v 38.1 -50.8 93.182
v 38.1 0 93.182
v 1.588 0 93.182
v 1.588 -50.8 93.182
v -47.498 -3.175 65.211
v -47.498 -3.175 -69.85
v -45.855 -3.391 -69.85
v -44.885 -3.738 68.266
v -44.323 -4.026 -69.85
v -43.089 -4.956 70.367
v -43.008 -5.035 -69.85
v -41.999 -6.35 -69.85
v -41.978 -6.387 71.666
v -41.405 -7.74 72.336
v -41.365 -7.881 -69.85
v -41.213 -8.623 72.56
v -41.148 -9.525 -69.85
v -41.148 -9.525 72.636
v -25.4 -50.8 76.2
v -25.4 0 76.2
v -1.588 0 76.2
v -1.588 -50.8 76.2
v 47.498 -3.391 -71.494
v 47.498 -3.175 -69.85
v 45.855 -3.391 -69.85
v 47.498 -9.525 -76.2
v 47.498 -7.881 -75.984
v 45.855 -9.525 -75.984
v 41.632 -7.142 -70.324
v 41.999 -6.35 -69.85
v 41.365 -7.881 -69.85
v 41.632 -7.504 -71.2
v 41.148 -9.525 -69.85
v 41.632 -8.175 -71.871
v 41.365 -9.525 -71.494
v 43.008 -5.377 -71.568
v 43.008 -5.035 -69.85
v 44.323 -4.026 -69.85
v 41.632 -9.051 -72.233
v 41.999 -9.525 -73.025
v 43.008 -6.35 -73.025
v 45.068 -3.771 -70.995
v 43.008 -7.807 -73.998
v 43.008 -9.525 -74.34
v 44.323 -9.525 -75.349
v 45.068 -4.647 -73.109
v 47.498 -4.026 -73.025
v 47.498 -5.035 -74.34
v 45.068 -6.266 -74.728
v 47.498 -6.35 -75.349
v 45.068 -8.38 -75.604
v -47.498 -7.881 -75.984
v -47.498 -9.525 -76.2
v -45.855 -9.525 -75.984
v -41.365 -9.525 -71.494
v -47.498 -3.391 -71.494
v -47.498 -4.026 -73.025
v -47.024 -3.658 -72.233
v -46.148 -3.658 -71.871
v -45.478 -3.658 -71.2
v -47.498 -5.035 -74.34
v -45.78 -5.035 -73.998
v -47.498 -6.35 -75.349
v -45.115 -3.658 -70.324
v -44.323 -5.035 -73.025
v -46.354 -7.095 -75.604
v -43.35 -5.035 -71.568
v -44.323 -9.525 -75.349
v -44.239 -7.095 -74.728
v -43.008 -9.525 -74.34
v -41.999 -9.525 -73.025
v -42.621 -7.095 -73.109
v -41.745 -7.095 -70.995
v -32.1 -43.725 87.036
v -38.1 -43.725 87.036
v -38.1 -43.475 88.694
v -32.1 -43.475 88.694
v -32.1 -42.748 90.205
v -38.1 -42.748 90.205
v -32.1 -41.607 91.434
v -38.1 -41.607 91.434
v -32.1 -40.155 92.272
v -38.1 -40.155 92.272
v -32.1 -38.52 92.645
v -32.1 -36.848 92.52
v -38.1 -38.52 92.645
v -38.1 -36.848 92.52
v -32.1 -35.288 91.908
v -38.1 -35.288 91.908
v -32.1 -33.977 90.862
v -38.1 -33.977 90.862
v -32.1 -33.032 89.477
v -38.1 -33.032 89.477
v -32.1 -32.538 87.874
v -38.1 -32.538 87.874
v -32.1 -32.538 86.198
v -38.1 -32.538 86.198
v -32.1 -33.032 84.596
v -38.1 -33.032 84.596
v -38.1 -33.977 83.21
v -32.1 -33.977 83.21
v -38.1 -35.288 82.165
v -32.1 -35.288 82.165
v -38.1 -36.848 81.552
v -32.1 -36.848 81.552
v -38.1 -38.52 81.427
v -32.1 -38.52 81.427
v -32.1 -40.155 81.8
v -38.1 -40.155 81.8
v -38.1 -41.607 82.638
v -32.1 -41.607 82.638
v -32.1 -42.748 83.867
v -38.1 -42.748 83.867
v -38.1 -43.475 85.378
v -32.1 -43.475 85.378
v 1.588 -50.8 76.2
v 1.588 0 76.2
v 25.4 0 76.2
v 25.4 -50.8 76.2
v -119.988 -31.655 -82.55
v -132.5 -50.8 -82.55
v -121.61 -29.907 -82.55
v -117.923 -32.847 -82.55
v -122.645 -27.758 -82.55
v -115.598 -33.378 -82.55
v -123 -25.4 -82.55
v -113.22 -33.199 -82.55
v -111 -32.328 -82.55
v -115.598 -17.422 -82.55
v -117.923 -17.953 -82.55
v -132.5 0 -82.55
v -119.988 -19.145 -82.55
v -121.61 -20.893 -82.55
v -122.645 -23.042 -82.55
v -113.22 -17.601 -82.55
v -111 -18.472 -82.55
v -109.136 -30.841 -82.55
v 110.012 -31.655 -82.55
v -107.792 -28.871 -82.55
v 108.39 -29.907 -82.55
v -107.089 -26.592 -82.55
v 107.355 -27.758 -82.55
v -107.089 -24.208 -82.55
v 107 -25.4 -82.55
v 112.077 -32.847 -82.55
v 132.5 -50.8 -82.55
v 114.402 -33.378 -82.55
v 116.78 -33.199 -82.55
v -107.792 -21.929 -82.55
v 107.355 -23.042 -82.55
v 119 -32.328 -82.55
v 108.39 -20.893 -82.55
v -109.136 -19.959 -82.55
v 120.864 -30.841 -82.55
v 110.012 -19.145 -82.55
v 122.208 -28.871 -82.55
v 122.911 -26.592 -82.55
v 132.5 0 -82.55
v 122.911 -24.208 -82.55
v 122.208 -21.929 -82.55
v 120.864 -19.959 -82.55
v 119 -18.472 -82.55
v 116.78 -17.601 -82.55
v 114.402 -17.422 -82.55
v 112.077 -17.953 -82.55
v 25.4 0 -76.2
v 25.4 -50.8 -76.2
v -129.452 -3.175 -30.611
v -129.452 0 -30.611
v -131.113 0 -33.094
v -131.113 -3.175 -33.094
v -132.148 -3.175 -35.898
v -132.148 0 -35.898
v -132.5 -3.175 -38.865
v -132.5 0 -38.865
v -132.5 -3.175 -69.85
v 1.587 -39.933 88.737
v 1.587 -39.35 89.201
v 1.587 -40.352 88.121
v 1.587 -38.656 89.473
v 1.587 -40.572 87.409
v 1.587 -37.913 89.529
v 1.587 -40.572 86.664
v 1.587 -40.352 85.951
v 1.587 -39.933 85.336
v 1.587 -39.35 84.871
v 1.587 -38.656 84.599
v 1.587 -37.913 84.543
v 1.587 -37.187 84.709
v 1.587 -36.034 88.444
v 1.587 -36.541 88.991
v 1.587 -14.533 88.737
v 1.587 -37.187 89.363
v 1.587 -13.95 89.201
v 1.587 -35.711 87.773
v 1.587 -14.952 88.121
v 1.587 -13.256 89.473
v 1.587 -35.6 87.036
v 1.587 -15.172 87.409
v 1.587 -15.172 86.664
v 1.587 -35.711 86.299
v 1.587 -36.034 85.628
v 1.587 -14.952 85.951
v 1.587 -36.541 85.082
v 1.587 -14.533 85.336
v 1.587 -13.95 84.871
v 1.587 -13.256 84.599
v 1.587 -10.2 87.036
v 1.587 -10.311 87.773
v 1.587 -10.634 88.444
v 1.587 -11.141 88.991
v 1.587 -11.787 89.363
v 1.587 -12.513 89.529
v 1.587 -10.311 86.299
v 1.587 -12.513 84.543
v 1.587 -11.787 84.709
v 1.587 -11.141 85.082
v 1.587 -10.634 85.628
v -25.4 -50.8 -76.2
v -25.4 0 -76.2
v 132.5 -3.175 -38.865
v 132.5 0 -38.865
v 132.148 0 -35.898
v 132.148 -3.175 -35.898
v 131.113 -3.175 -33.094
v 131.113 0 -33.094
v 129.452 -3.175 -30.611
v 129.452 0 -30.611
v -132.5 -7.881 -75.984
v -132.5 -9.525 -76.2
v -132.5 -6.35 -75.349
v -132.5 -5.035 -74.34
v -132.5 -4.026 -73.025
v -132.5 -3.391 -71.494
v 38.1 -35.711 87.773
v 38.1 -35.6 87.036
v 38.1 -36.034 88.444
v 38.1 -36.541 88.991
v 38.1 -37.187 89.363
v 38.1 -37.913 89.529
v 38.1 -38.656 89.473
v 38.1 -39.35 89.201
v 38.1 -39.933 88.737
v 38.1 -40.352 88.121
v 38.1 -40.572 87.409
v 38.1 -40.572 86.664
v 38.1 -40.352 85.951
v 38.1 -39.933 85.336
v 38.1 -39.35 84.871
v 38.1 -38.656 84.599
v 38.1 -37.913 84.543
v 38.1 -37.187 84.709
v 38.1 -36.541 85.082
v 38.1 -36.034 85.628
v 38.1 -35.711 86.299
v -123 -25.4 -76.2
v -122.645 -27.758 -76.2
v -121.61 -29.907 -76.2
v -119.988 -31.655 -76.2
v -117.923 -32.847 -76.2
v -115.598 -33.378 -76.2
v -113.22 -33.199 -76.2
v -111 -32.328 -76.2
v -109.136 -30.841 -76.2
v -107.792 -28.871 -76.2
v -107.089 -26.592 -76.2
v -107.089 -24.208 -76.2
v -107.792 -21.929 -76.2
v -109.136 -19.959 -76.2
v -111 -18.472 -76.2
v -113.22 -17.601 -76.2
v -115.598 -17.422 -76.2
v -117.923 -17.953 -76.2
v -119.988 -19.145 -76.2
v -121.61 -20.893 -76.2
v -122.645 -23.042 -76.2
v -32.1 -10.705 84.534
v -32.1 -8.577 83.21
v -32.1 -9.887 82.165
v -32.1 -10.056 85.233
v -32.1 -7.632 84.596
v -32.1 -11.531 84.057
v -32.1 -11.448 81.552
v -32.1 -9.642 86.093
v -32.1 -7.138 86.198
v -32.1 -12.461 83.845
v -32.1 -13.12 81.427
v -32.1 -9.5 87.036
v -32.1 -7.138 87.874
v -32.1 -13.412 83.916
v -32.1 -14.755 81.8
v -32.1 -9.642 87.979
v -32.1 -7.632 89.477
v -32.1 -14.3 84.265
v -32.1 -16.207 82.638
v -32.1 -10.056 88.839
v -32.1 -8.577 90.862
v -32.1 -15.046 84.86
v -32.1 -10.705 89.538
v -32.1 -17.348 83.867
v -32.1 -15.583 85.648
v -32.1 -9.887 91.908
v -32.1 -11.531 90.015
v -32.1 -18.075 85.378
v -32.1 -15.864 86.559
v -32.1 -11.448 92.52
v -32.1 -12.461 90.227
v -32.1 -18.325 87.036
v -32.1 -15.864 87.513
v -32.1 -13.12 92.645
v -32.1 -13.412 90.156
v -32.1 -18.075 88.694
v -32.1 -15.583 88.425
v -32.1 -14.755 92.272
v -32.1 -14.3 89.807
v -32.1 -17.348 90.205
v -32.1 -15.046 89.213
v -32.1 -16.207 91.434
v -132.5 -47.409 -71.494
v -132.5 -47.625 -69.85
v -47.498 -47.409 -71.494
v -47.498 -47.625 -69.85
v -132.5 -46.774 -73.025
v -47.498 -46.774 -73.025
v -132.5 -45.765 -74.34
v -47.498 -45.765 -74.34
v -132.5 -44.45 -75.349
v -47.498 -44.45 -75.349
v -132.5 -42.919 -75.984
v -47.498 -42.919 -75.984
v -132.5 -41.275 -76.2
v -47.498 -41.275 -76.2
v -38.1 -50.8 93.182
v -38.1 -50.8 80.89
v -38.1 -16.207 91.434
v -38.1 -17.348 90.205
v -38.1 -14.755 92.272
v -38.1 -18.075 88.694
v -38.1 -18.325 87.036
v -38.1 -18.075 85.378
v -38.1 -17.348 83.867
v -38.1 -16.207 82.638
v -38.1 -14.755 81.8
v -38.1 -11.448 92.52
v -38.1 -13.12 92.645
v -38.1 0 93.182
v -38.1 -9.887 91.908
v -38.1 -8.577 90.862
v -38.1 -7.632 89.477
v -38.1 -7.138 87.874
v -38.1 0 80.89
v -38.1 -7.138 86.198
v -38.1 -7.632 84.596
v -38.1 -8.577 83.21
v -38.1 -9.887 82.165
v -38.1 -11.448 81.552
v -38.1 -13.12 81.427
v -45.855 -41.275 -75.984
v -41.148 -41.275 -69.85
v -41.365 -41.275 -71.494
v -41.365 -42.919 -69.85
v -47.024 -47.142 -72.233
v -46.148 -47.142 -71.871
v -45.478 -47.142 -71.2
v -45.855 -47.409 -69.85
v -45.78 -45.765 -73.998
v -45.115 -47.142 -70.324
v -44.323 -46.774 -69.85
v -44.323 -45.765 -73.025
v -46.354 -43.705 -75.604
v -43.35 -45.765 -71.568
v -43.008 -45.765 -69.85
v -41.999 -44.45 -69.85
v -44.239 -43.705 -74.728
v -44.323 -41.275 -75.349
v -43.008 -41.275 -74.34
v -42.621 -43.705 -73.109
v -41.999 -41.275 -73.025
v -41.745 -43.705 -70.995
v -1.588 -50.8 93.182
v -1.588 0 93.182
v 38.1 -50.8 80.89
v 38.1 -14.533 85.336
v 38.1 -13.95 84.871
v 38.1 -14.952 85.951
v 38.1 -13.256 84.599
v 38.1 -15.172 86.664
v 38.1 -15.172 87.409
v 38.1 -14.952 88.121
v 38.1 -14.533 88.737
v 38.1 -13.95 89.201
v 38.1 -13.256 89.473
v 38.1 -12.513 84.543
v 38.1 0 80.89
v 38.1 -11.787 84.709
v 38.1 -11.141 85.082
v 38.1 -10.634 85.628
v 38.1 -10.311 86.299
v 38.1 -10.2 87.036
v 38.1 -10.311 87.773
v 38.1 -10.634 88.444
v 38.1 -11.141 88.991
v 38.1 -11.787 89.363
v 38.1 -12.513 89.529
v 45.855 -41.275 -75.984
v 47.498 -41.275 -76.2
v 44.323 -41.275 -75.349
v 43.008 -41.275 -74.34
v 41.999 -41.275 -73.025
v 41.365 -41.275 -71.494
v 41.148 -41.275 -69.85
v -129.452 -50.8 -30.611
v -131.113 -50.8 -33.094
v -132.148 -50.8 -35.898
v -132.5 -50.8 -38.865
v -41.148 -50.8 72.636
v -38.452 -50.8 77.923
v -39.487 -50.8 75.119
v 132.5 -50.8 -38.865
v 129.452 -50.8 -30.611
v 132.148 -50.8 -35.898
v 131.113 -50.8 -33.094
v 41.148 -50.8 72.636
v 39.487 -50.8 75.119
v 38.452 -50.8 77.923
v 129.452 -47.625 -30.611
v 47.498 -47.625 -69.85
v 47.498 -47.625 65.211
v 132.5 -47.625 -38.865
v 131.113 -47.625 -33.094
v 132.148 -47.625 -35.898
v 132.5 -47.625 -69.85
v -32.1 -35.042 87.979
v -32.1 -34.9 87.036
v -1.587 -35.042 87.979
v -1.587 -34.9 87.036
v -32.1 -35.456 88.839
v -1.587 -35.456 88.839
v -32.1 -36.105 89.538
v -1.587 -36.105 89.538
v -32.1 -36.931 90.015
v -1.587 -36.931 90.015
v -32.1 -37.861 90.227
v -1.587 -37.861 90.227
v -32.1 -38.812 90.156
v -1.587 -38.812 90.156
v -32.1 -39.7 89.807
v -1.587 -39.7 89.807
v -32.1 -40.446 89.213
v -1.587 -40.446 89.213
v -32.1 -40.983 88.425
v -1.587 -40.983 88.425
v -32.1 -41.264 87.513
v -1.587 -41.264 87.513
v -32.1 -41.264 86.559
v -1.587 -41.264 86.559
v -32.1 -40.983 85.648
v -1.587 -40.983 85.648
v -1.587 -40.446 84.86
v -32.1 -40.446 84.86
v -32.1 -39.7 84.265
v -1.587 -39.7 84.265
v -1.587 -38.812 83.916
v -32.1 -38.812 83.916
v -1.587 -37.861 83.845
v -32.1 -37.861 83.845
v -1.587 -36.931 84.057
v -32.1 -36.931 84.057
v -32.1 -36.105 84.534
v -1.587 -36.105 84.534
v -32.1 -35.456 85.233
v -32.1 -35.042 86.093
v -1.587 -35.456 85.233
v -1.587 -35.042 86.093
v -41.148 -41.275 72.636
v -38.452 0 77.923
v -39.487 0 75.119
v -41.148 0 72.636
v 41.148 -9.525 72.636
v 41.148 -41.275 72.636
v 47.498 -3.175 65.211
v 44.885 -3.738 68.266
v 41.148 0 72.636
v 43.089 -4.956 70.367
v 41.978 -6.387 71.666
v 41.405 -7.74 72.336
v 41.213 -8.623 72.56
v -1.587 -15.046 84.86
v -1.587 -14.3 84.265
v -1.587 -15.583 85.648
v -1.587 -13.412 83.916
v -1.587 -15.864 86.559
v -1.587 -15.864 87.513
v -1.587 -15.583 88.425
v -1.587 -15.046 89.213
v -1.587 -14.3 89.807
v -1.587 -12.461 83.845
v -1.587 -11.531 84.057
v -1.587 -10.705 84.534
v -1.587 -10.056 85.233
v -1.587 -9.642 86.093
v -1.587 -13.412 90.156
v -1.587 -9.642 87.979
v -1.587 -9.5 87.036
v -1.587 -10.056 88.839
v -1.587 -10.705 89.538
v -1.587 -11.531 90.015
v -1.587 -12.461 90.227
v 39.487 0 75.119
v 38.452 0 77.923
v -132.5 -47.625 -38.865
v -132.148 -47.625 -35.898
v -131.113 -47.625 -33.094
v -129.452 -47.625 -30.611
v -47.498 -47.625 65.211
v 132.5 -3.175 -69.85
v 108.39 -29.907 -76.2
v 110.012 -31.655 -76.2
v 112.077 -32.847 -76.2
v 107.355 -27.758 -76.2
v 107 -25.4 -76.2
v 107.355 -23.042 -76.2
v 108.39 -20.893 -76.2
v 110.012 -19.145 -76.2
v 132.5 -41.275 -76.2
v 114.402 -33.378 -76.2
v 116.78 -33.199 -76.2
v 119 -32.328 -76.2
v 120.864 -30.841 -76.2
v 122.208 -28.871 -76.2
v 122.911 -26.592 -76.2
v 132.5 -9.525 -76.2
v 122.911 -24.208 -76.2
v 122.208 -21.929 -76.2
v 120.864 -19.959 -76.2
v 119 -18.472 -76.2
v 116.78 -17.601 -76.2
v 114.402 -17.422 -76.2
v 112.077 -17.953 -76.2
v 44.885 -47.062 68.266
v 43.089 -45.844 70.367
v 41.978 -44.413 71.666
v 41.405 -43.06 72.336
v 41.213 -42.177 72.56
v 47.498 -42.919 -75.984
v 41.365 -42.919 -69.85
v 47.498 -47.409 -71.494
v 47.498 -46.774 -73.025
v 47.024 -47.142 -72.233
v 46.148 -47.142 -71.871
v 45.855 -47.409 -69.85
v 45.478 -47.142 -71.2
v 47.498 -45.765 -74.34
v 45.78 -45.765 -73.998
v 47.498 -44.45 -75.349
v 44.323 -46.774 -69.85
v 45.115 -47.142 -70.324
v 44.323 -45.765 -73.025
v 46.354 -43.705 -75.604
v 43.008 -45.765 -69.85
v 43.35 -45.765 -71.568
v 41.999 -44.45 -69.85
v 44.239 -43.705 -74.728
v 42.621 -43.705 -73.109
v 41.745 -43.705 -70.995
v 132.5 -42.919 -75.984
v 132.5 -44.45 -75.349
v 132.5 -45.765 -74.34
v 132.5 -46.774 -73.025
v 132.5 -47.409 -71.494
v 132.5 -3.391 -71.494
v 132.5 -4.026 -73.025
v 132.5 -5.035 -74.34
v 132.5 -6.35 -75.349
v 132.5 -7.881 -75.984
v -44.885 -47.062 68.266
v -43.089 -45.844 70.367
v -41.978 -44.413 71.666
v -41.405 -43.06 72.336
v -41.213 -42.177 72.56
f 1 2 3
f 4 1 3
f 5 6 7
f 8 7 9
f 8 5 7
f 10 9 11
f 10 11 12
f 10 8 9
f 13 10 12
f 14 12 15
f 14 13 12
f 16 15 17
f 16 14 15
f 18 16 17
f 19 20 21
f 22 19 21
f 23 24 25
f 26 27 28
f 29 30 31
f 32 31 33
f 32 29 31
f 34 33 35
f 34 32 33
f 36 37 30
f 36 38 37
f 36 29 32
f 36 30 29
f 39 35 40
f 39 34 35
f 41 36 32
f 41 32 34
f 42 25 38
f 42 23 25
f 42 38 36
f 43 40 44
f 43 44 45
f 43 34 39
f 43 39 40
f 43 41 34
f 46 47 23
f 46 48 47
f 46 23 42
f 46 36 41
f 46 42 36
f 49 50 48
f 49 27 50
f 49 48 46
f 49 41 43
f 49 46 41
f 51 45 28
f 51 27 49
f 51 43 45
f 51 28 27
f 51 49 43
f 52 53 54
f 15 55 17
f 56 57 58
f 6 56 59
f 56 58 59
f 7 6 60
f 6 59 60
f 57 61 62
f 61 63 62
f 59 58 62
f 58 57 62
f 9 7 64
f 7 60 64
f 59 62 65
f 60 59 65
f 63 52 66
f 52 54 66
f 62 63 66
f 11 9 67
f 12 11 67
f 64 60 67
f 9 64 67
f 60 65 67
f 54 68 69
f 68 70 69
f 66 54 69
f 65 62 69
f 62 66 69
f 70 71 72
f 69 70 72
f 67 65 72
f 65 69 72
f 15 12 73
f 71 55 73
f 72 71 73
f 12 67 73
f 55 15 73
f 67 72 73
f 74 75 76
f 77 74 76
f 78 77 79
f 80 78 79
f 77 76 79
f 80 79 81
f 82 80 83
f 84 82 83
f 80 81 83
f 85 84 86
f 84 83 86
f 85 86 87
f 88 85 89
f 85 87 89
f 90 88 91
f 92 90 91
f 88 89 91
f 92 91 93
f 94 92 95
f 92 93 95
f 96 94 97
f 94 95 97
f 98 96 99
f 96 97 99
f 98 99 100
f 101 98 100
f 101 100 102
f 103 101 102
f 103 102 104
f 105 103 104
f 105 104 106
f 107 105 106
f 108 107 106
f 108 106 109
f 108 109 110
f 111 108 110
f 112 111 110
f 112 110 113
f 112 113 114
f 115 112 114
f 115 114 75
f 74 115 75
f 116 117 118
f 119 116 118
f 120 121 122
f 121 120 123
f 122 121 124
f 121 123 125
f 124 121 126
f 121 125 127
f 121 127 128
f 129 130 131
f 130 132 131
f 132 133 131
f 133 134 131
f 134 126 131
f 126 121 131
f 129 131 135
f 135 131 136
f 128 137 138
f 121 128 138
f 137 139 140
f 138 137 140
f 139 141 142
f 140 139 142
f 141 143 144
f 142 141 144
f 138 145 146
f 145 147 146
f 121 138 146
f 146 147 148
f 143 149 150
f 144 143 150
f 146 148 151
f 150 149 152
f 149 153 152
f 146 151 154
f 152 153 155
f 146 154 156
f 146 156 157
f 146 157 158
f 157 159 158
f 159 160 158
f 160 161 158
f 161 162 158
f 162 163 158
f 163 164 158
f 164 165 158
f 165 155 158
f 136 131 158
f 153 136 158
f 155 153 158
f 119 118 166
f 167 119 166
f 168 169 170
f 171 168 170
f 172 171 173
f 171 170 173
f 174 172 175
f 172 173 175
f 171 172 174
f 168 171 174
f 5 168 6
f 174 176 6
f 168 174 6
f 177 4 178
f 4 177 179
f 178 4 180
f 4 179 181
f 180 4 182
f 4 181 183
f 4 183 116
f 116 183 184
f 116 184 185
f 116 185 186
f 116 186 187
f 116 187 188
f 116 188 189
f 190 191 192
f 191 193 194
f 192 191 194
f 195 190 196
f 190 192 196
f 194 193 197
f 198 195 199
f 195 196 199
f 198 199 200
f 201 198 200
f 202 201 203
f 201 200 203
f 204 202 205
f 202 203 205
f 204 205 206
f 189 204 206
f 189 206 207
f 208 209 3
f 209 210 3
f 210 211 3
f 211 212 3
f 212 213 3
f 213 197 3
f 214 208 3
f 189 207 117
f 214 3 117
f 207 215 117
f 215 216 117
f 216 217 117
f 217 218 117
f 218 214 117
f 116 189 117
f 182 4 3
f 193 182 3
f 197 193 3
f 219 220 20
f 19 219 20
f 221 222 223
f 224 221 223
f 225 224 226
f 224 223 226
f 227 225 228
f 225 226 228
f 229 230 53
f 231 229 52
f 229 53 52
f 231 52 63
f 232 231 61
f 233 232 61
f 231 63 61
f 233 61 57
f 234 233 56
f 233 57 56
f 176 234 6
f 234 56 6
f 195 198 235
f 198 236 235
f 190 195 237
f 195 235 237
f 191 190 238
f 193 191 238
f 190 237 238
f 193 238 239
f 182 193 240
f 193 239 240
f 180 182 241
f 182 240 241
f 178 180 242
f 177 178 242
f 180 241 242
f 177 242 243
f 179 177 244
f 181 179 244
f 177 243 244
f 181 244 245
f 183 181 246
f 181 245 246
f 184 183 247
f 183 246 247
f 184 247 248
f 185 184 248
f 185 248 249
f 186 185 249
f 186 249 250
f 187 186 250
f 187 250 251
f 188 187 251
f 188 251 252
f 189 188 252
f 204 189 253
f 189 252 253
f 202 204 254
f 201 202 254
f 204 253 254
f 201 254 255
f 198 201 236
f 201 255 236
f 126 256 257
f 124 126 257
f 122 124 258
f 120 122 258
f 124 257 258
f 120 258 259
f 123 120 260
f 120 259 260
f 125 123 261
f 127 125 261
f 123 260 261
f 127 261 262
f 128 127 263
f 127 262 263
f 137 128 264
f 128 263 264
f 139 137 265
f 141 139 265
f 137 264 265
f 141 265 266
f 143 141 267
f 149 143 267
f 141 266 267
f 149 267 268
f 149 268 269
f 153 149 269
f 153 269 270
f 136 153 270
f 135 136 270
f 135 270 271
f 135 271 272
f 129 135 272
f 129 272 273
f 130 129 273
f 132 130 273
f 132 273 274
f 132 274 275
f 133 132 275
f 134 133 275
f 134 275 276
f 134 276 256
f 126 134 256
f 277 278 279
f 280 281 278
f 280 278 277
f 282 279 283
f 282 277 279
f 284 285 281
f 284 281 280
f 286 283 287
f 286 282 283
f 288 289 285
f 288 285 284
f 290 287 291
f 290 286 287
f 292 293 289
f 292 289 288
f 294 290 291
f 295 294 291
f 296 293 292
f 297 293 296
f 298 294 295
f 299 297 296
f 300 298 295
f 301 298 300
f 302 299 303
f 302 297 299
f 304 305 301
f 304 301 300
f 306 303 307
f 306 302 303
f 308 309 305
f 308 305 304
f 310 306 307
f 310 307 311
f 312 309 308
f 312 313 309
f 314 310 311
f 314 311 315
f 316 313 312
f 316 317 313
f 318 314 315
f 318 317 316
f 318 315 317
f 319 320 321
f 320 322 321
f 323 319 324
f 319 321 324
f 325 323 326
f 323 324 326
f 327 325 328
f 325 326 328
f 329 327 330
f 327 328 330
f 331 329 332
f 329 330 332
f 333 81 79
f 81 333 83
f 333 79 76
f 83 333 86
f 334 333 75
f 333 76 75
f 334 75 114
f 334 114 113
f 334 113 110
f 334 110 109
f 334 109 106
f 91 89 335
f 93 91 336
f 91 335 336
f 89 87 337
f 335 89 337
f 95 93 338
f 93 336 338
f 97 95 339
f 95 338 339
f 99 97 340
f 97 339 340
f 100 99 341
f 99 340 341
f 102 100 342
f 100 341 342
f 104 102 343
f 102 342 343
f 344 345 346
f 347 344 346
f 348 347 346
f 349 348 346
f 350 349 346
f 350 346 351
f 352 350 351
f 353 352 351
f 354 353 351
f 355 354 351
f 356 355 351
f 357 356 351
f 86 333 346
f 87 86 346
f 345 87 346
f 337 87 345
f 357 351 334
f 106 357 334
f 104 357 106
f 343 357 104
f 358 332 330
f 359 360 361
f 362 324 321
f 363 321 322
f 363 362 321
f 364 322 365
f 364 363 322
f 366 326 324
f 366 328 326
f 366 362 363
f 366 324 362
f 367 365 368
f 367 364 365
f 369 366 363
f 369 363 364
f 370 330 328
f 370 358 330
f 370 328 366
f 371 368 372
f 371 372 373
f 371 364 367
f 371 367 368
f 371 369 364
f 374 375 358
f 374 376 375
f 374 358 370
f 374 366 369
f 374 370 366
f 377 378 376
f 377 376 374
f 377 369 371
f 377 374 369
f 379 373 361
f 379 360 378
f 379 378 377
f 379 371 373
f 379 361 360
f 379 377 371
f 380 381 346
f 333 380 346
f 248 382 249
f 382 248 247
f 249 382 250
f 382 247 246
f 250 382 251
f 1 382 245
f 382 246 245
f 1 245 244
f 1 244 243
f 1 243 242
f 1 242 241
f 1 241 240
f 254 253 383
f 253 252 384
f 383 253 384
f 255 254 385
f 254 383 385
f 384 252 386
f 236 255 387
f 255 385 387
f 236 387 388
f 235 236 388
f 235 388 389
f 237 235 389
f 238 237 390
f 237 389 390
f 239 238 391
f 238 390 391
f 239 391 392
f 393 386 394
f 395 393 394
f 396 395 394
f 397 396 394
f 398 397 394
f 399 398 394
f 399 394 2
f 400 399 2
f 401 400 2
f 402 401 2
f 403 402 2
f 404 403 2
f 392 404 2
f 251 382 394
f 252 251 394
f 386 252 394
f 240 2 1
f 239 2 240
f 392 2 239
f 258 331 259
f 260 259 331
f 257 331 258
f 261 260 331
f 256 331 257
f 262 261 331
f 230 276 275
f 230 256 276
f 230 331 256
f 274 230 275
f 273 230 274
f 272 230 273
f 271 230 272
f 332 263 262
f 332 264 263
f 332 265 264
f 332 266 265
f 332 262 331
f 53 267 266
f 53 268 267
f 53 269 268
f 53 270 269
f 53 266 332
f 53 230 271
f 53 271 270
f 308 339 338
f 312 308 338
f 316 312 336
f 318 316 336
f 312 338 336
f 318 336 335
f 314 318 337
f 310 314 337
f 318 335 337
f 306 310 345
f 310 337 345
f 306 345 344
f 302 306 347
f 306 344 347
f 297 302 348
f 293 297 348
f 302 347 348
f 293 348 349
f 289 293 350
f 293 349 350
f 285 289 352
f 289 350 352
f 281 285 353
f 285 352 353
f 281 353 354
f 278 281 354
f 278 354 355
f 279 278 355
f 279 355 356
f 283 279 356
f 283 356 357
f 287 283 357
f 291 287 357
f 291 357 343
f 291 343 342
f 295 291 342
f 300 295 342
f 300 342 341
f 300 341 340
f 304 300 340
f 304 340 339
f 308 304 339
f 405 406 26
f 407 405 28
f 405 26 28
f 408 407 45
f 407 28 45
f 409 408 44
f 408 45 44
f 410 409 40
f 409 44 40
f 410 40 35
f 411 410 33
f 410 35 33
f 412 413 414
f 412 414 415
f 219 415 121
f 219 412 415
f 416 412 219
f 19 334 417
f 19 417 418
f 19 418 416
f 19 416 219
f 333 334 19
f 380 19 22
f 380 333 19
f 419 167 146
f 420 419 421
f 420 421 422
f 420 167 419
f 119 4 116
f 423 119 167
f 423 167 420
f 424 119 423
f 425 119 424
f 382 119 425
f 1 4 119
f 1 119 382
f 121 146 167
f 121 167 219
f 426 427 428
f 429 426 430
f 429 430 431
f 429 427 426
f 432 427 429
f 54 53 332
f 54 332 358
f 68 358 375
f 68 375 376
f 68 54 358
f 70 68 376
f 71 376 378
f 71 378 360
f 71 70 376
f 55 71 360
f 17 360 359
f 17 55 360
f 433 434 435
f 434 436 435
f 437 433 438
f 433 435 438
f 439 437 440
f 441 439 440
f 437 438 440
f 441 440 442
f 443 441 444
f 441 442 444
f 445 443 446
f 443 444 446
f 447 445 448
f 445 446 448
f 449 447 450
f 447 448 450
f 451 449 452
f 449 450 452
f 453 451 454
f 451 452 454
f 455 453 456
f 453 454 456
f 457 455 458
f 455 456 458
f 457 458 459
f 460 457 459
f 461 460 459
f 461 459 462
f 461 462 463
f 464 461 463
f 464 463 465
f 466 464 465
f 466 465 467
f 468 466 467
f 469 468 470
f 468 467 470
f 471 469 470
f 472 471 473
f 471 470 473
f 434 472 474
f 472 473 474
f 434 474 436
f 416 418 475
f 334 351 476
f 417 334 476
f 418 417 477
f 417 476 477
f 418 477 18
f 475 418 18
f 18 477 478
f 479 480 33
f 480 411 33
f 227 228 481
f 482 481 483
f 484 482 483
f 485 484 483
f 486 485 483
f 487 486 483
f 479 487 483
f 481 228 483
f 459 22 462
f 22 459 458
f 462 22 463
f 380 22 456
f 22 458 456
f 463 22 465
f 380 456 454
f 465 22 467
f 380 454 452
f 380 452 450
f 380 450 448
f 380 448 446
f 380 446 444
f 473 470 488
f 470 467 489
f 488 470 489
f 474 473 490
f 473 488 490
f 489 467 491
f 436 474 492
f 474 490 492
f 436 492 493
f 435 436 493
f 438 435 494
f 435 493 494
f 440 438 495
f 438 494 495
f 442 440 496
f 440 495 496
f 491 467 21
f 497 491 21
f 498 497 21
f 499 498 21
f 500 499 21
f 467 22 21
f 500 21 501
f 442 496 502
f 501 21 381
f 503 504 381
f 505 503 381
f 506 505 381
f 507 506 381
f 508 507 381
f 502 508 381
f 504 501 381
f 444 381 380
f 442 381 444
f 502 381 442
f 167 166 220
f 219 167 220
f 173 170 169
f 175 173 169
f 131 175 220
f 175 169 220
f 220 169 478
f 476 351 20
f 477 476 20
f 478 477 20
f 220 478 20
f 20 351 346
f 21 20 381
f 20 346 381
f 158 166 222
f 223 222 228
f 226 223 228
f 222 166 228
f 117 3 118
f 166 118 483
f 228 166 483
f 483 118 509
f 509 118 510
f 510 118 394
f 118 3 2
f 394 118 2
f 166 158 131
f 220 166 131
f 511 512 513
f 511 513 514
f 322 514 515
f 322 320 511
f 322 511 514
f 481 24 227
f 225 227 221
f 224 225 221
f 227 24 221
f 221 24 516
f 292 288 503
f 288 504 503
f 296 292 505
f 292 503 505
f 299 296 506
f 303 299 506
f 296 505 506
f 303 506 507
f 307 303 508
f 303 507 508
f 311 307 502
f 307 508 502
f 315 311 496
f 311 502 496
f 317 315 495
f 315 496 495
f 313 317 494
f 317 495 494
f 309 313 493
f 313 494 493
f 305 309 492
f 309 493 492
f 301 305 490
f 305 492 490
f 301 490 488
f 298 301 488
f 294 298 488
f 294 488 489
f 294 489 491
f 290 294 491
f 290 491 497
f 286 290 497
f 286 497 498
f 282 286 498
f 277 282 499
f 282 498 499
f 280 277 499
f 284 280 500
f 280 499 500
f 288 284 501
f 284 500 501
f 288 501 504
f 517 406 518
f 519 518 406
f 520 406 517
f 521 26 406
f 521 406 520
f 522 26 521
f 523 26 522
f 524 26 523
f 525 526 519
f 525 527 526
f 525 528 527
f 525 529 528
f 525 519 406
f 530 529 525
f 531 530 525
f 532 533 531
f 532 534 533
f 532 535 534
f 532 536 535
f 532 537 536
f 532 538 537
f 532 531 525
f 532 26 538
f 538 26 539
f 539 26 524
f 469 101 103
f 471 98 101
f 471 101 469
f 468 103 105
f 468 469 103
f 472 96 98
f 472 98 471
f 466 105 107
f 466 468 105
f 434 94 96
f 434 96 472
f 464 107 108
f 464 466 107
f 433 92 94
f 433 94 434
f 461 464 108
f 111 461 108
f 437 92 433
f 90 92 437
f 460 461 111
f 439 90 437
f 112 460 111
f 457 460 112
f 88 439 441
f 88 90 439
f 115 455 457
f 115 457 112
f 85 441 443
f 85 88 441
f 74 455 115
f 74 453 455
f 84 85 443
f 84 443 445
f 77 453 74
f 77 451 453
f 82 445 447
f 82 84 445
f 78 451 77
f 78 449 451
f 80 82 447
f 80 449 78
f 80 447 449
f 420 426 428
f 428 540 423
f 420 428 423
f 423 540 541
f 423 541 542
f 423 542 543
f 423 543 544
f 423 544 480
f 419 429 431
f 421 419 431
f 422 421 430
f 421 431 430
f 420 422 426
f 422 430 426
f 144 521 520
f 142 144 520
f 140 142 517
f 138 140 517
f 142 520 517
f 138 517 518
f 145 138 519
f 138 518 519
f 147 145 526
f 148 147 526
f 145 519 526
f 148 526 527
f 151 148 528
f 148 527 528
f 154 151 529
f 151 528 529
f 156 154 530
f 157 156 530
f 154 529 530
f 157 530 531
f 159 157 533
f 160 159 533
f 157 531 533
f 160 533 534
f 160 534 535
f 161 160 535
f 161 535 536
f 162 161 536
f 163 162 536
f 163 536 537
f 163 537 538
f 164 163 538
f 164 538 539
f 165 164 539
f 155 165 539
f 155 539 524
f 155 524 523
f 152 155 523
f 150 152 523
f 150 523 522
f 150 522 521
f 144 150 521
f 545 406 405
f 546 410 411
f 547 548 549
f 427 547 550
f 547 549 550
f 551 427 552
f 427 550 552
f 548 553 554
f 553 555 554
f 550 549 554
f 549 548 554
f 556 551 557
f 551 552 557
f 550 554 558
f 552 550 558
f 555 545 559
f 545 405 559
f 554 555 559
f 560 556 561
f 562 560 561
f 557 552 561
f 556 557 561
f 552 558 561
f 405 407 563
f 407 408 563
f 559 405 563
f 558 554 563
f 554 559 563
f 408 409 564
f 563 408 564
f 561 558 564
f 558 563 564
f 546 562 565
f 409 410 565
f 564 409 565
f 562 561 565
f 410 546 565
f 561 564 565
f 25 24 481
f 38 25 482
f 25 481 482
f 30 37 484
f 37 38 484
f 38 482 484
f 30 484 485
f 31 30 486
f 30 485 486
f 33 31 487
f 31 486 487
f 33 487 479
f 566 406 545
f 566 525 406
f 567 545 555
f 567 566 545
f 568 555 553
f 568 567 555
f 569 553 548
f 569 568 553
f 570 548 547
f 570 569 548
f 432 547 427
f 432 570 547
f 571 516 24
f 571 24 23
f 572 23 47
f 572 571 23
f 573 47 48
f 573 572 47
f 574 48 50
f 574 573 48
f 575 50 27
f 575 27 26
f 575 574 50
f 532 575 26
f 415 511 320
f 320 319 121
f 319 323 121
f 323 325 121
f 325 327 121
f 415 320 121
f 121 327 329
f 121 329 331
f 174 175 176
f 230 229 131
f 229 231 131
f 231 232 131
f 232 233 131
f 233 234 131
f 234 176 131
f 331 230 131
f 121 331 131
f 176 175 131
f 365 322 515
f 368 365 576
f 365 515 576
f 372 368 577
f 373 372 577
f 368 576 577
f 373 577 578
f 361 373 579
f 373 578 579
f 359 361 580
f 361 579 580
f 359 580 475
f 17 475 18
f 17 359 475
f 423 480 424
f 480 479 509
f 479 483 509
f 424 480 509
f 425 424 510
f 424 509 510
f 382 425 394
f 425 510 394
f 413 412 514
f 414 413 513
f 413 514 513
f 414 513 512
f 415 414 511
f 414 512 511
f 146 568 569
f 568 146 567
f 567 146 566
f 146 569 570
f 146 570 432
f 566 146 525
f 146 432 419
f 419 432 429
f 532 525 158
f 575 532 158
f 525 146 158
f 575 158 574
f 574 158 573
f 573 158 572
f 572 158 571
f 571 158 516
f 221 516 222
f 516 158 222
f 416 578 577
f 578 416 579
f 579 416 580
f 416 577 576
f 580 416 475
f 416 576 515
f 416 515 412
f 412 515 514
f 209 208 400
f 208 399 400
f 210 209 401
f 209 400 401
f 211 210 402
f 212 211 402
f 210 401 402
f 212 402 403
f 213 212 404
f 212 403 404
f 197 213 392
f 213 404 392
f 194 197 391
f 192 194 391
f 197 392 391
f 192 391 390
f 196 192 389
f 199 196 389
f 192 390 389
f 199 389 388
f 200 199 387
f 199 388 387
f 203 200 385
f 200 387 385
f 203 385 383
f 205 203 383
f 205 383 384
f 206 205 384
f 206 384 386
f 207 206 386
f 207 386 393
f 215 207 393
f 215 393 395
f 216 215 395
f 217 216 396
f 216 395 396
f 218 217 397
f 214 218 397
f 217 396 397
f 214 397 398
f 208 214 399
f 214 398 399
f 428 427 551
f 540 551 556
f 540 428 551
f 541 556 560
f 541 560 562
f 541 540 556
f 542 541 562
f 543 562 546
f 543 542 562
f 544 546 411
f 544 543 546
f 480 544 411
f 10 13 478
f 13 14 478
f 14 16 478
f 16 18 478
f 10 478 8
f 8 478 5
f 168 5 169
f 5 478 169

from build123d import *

# Parameters (mm, degrees)
F1_DEPTH       = 50.8
F3_D           = 6.4
F3_DEPTH       = 38.6
F3_CBORE_D     = 11.25
F3_CBORE_DEPTH = 6
F3_TIP         = 1.9227539809
F4_W           = 91.3515032281
F4_H           = 44.45
F5_DEPTH       = 180.1
F7_D           = 16
F8_R           = 6.35
F9_D           = 5
F9_CBORE_D     = 11.25
F9_CBORE_DEPTH = 6


with BuildPart() as f1:
    # F0 (on Front) → F1 (new body)
    with BuildSketch(Plane.XZ):
        with BuildLine():
            Line((-132.5, -38.8652200884), (-132.5, -82.55))
            Line((-132.5, -82.55), (132.5, -82.55))
            Line((132.5, -82.55), (132.5, -38.8652200884))
            ThreePointArc((132.5, -38.8652200884), (131.7135236391, -34.4654525376), (129.4515032281, -30.610616195))
            Line((129.4515032281, -30.610616195), (41.1484967719, 72.635616195))
            ThreePointArc((41.1484967719, 72.635616195), (38.8864763609, 76.4904525376), (38.1, 80.8902200884))
            Line((38.1, 80.8902200884), (38.1, 93.182))
            Line((38.1, 93.182), (1.5875, 93.182))
            Line((1.5875, 93.182), (1.5875, 76.2))
            Line((1.5875, 76.2), (25.4, 76.2))
            Line((25.4, 76.2), (25.4, -76.2))
            Line((25.4, -76.2), (-25.4, -76.2))
            Line((-25.4, -76.2), (-25.4, 76.2))
            Line((-25.4, 76.2), (-1.5875, 76.2))
            Line((-1.5875, 76.2), (-1.5875, 93.182))
            Line((-1.5875, 93.182), (-38.1, 93.182))
            Line((-38.1, 93.182), (-38.1, 80.8902200884))
            ThreePointArc((-38.1, 80.8902200884), (-38.8864763609, 76.4904525376), (-41.1484967719, 72.635616195))
            Line((-41.1484967719, 72.635616195), (-129.4515032281, -30.610616195))
            ThreePointArc((-129.4515032281, -30.610616195), (-131.7135236391, -34.4654525376), (-132.5, -38.8652200884))
        make_face()
    extrude(amount=F1_DEPTH)

    # F3
    with Locations(Plane(origin=(-38.1, 0, 0), x_dir=(0, -1, 0), z_dir=(-1, 0, 0))):
        with Locations((12.7, 87.0361100442), (38.1, 87.0361100442)):
            CounterBoreHole(F3_D / 2, F3_CBORE_D / 2, F3_CBORE_DEPTH, depth=F3_DEPTH)
            with Locations((0, 0, -(F3_DEPTH + F3_TIP / 2))):  # 118° drill point
                Cone(0, F3_D / 2, F3_TIP, mode=Mode.SUBTRACT)

    # F4 (on face) → F5 (cut)
    with BuildSketch(Plane.XY.offset(-76.2)):
        with Locations((86.8242483859, -25.4)):
            Rectangle(F4_W, F4_H)
        with Locations((-86.8242483859, -25.4)):
            Rectangle(F4_W, F4_H)
    extrude(amount=F5_DEPTH, mode=Mode.SUBTRACT)

    # F7 (through all)
    with Locations(Plane(origin=(0, 0, -82.55), x_dir=(1, 0, 0), z_dir=(0, 0, -1))):
        with Locations((-115, 25.4), (115, 25.4)):
            Hole(F7_D / 2)

    # F8
    f8_edges = [f1.edges().sort_by_distance(p)[0] for p in [
        (86.824248, -3.175, -76.2),
        (41.148497, -3.175, -1.782192),
        (41.148497, -25.4, -76.2),
        (86.824248, -47.625, -76.2),
        (41.148497, -47.625, -1.782192),
        (-41.148497, -25.4, -76.2),
        (-86.824248, -47.625, -76.2),
        (-41.148497, -47.625, -1.782192),
        (-86.824248, -3.175, -76.2),
        (-41.148497, -3.175, -1.782192),
    ]]
    fillet(f8_edges, radius=F8_R)

    # F9 (through all)
    with Locations(Plane(origin=(-38.1, 0, 0), x_dir=(0, -1, 0), z_dir=(-1, 0, 0))):
        with Locations((12.7, 87.0361100442), (38.1, 87.0361100442)):
            CounterBoreHole(F9_D / 2, F9_CBORE_D / 2, F9_CBORE_DEPTH)


solid = f1.part
